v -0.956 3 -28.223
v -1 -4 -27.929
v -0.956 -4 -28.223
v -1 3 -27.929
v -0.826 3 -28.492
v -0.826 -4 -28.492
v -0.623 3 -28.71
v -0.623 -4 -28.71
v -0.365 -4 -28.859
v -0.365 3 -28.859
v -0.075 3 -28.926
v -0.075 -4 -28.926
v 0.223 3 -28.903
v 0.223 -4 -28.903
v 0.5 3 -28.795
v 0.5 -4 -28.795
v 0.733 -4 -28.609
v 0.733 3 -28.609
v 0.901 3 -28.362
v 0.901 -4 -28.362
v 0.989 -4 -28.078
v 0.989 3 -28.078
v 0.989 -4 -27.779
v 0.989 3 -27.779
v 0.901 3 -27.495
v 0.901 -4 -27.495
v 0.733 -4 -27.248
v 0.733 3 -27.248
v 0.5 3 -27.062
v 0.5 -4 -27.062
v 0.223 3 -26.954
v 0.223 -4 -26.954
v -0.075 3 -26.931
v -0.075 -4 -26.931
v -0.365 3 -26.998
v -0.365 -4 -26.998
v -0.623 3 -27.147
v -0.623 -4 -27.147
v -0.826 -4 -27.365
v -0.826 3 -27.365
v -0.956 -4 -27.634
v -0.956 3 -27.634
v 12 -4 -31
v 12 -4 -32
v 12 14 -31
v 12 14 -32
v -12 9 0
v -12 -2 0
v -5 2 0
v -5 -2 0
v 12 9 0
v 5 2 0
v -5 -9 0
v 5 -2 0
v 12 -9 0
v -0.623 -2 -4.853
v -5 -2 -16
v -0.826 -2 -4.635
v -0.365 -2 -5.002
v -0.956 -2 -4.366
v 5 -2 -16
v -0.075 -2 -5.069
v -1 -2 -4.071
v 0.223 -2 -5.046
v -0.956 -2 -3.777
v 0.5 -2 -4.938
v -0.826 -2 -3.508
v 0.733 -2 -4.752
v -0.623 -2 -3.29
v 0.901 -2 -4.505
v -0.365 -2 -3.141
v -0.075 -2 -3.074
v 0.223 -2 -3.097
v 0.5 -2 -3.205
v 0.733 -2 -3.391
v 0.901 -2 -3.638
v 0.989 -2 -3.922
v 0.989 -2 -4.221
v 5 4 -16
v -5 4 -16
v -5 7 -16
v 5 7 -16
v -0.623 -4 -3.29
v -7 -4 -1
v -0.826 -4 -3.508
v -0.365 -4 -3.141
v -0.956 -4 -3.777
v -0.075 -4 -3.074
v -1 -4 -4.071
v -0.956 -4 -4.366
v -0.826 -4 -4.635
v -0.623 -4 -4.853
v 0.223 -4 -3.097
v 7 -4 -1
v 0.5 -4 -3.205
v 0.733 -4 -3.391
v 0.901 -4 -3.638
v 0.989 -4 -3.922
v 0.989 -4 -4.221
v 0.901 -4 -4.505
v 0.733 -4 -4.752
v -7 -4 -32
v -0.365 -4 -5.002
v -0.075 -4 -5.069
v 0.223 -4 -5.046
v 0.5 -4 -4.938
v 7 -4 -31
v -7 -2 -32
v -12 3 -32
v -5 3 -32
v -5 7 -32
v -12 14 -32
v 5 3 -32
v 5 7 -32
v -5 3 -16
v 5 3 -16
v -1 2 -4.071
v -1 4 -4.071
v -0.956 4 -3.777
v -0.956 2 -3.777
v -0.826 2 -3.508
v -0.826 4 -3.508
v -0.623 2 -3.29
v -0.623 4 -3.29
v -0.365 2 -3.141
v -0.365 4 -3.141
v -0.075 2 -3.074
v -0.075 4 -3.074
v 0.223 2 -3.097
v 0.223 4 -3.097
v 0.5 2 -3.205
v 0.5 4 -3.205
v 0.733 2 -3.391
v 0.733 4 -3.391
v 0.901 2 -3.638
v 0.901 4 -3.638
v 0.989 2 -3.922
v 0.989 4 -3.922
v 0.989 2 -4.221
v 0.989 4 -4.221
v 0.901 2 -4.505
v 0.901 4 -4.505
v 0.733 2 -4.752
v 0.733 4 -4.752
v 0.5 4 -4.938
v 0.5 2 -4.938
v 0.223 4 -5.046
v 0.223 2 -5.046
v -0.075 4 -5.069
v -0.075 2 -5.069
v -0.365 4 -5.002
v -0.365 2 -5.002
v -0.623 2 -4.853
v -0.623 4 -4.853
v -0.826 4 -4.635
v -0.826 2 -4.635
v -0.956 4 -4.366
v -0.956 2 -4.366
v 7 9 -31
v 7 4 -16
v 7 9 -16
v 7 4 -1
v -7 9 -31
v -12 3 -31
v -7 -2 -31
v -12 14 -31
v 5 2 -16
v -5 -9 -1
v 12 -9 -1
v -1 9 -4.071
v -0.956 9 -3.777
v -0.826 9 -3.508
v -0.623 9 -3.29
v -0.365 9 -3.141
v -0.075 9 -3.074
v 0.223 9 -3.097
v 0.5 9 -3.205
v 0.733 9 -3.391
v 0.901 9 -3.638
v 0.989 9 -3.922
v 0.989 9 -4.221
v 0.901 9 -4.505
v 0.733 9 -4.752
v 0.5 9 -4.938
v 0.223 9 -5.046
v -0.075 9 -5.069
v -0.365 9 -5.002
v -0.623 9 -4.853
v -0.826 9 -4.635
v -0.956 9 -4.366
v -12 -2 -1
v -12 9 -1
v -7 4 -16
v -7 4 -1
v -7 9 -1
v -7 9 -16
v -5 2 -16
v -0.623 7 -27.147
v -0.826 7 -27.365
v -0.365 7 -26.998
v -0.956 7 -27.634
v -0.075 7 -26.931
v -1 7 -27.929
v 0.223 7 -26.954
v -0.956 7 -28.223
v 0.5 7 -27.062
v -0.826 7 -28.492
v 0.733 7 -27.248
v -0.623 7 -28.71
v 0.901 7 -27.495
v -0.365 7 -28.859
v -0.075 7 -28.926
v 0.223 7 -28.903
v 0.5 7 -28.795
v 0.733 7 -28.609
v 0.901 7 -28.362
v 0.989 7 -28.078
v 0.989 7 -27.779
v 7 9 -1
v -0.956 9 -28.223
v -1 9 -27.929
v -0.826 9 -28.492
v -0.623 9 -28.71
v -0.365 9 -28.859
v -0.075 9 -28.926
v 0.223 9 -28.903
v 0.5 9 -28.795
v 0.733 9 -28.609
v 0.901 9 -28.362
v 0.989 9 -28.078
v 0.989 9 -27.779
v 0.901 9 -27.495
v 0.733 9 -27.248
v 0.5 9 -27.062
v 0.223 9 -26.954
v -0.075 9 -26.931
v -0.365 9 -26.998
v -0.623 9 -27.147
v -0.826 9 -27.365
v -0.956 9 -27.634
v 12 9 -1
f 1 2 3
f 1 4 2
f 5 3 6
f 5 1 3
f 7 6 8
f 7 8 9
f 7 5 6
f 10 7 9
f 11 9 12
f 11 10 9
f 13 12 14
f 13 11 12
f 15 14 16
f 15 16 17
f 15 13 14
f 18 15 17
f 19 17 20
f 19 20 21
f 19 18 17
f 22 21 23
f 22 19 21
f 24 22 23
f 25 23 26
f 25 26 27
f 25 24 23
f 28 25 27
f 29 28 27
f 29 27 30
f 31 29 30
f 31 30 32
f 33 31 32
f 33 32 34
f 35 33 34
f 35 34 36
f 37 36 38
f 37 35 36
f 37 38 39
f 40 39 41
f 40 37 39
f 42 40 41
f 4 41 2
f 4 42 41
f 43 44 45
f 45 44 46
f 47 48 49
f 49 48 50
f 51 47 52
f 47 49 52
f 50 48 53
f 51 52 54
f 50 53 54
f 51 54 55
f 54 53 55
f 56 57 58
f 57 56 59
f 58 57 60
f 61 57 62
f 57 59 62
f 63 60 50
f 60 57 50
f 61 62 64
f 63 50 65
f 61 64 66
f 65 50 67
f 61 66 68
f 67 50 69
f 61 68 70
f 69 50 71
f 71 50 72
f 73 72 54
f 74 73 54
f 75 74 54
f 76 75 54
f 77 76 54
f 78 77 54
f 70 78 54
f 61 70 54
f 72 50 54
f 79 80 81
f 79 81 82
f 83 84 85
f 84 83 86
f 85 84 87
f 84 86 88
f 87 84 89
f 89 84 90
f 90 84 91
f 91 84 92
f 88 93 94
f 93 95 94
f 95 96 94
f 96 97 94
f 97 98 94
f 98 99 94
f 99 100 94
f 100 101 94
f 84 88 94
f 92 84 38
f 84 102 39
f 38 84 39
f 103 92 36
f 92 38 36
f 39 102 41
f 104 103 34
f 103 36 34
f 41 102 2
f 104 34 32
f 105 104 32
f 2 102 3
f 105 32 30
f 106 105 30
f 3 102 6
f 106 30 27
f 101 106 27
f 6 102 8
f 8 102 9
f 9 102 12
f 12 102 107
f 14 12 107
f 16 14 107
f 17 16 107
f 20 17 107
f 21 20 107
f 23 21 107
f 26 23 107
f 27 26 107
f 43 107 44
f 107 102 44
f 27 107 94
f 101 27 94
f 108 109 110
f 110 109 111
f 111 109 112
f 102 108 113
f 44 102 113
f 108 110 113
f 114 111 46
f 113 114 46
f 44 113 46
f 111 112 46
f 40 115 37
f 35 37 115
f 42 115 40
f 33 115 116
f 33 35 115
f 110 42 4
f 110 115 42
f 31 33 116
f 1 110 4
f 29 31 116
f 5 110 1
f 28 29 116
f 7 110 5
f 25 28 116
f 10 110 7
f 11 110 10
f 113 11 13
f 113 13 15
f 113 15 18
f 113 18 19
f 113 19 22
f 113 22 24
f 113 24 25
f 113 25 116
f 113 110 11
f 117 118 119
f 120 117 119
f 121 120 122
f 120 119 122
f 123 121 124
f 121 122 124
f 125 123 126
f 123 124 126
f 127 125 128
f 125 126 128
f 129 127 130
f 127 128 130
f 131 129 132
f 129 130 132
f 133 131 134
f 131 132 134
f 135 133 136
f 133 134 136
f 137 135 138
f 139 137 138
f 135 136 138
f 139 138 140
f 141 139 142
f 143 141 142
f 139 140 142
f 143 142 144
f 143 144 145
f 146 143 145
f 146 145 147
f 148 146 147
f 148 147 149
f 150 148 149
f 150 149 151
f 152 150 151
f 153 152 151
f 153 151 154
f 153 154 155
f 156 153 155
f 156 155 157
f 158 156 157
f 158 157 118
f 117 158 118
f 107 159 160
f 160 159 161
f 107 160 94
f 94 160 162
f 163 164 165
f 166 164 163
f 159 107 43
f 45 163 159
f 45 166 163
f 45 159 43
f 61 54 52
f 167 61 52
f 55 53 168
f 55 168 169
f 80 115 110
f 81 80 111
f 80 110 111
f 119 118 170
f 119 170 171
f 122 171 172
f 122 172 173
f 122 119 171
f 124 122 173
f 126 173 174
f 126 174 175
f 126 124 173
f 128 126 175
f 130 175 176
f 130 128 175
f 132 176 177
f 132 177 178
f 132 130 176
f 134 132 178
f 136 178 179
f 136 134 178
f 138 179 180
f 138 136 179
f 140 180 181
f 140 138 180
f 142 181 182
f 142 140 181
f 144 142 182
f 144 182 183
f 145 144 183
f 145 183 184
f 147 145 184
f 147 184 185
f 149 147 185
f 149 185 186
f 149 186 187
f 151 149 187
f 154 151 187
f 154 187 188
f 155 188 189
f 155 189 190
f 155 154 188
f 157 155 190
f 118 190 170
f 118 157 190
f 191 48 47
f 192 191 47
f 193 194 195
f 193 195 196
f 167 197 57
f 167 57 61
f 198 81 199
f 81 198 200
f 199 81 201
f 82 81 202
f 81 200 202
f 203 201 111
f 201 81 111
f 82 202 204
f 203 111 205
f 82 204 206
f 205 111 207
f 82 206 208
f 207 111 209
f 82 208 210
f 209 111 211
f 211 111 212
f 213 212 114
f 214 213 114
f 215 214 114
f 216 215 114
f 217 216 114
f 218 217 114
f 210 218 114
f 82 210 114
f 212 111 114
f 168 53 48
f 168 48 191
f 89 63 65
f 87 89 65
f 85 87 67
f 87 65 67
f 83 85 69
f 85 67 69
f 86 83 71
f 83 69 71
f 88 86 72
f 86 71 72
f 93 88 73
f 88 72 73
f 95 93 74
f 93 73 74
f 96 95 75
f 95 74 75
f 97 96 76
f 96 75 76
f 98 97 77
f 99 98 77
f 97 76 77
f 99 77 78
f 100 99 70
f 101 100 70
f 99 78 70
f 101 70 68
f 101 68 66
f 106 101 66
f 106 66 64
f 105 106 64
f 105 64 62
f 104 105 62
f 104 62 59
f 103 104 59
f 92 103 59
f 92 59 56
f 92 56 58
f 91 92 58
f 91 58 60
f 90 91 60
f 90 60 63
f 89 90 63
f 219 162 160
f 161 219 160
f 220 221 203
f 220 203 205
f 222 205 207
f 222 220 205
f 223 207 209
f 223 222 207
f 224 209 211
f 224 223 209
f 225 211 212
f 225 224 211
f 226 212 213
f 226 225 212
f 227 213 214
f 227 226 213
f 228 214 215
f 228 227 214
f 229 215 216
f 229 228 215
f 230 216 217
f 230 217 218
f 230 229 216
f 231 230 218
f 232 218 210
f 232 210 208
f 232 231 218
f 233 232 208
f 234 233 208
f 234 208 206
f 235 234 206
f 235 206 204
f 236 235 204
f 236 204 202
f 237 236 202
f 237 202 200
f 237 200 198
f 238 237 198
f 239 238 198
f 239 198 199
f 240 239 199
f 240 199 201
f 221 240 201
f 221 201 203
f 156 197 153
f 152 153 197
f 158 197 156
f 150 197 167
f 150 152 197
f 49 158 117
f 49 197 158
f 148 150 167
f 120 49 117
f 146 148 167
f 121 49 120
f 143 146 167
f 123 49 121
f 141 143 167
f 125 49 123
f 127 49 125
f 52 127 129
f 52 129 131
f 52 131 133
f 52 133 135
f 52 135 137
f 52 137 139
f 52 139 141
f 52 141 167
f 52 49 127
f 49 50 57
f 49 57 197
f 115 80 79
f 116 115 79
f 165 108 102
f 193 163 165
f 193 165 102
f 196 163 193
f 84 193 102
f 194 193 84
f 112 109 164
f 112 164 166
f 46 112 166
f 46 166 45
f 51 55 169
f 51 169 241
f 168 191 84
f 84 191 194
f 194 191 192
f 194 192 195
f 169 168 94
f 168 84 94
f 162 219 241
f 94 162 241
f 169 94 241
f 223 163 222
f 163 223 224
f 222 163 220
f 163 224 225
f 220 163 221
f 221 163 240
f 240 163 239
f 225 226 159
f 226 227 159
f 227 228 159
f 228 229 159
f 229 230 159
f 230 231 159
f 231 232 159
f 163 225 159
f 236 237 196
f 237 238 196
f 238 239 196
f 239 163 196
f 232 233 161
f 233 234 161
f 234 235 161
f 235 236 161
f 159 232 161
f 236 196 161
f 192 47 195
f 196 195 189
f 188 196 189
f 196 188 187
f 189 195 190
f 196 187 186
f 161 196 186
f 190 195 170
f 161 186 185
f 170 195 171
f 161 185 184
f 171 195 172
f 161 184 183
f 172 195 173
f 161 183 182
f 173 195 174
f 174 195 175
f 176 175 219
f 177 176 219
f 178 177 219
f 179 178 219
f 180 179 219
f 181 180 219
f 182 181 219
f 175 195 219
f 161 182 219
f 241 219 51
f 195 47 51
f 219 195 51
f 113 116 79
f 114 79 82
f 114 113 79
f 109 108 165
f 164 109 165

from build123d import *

# Parameters (mm, degrees)
F0_W      = 14
F0_H      = 8
F0_W_2    = 10
F0_H_2    = 4
F1_DEPTH  = 16
F2_W      = 24
F2_H      = 18
F2_W_2    = 14
F2_H_2    = 8
F3_DEPTH  = 1
F4_R      = 1
F5_DEPTH  = 18.001
F6_SIZE   = 7
F9_DEPTH  = 5
F10_DEPTH = 5


with BuildPart() as f1:
    # F0 (on Top) → F1 (new body)
    with BuildSketch(Plane.XY):
        Rectangle(F0_W, F0_H)
        Rectangle(F0_W_2, F0_H_2, mode=Mode.SUBTRACT)
    extrude(amount=-F1_DEPTH)

    # F4 (on face) → F5 (cut, through all)
    with BuildSketch(Plane(origin=(0, 9, 0), x_dir=(-1, 0, 0), z_dir=(0, 1, 0))):
        with BuildLine():
            ThreePointArc((1, -28), (0, -27), (-1, -28))
            Line((-1, -28), (1, -28))
        make_face()
        with BuildLine():
            Line((1, -28), (-1, -28))
            ThreePointArc((-1, -28), (0, -29), (1, -28))
        make_face()
        with Locations((0, -4.0714931674)):
            Circle(F4_R)
    extrude(amount=-F5_DEPTH, mode=Mode.SUBTRACT)


with BuildPart() as f3:
    # F2 (on face) → F3 (new body)
    with BuildSketch(Plane.XY):
        Rectangle(F2_W, F2_H)
        Rectangle(F2_W_2, F2_H_2, mode=Mode.SUBTRACT)
    extrude(amount=-F3_DEPTH)

    # F6
    f6_edges = [f3.edges().sort_by_distance(p)[0] for p in [
        (-12, -9, -0.5),
    ]]
    chamfer(f6_edges, length=F6_SIZE)


with BuildPart() as f7_1:
    # F7: instance of F3
    add(f3.part.mirror(Plane(origin=(0, 0, -16), x_dir=(1, 0, 0), z_dir=(0, 0, -1))))


with BuildPart() as f7_2:
    # F7: instance of F1
    add(f1.part.mirror(Plane(origin=(0, 0, -16), x_dir=(1, 0, 0), z_dir=(0, 0, -1))))


with BuildPart() as f7_2_1:
    # F8: moved
    add(f7_2.part.moved(Location((0, 5, 0))))


with BuildPart() as f7_1_1:
    # F8: moved
    add(f7_1.part.moved(Location((0, 5, 0))))


with BuildPart() as f1_1:
    add(f1.part)

    # F9 (add, through all): a face of the model
    f9_faces = [f7_2_1.part.faces().sort_by_distance(p)[0] for p in [
        (0, 1, -23.9441190926),
    ]]

    add(f7_1_1.part)  # F9 merges F7_1

    add(f7_2_1.part)  # F9 merges F7_2
    extrude(f9_faces, amount=F9_DEPTH)

    # F10 (add, through all): a face of the model
    f10_faces = [f1_1.faces().sort_by_distance(p)[0] for p in [
        (0, 4, -8.0558809074),
    ]]

    add(f3.part)  # F10 merges F3
    extrude(f10_faces, amount=F10_DEPTH)


solid = f1_1.part
